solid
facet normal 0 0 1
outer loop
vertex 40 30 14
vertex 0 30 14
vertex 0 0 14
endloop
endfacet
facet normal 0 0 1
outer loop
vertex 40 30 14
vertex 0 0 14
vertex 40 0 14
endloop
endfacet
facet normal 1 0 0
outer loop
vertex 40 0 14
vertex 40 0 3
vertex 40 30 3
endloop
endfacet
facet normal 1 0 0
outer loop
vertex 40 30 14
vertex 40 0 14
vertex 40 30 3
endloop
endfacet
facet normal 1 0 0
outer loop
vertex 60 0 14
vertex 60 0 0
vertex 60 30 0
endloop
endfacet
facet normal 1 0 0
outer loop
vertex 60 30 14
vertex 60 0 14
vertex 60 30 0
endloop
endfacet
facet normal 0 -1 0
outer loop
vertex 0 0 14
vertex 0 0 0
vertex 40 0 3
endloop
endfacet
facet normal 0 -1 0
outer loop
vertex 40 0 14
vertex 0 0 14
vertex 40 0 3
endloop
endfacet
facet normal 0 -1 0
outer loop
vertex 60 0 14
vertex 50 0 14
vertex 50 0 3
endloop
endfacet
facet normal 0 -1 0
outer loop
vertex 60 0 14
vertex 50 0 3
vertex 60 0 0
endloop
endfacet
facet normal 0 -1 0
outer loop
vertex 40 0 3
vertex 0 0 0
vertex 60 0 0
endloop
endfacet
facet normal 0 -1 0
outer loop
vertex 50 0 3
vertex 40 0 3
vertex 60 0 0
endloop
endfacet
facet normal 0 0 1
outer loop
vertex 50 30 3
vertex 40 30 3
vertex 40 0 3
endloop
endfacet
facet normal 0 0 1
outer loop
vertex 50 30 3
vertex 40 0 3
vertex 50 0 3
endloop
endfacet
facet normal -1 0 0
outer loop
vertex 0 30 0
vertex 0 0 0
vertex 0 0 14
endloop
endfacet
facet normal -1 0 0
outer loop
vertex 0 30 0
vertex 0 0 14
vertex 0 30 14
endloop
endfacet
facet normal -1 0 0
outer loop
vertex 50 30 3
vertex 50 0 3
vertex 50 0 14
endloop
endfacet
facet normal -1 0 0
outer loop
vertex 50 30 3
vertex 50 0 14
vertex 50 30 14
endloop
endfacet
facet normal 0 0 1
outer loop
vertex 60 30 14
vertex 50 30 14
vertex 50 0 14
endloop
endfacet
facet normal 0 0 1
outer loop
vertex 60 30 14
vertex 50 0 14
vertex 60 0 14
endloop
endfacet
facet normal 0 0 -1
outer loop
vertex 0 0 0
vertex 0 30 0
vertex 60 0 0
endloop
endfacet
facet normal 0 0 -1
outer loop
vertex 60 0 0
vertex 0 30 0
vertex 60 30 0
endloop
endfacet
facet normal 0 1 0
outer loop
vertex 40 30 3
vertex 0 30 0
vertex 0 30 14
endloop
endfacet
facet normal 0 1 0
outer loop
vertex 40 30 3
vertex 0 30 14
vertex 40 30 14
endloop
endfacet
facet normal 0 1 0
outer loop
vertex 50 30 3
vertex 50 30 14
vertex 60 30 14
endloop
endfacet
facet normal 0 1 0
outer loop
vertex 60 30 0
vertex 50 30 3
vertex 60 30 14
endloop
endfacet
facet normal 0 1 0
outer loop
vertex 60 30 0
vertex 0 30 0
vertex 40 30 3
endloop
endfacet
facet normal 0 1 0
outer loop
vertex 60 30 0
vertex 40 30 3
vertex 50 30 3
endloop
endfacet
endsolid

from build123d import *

# Parameters (mm, degrees)
BOX001_W     = 40
BOX001_H     = 30
BOX001_DEPTH = 14
BOX002_W     = 10
BOX002_H     = 30
BOX002_DEPTH = 14
BOX_W        = 60
BOX_H        = 30
BOX_DEPTH    = 3


with BuildPart() as cubo001:
    # Box001 → Box001 (new body)
    with BuildSketch(Plane.XY):
        with Locations((20, 15)):
            Rectangle(BOX001_W, BOX001_H)
    extrude(amount=BOX001_DEPTH)


with BuildPart() as cubo002:
    # Box002 → Box002 (new body)
    with BuildSketch(Plane(origin=(50, 0, 0), x_dir=(1, 0, 0), z_dir=(0, 0, 1))):
        with Locations((5, 15)):
            Rectangle(BOX002_W, BOX002_H)
    extrude(amount=BOX002_DEPTH)


with BuildPart() as fusion:
    # Box → Box (new body)
    with BuildSketch(Plane.XY):
        with Locations((30, 15)):
            Rectangle(BOX_W, BOX_H)
    extrude(amount=BOX_DEPTH)

    # Fusion: union Cubo001, Cubo002
    add(cubo001.part)
    add(cubo002.part)


solid = fusion.part
